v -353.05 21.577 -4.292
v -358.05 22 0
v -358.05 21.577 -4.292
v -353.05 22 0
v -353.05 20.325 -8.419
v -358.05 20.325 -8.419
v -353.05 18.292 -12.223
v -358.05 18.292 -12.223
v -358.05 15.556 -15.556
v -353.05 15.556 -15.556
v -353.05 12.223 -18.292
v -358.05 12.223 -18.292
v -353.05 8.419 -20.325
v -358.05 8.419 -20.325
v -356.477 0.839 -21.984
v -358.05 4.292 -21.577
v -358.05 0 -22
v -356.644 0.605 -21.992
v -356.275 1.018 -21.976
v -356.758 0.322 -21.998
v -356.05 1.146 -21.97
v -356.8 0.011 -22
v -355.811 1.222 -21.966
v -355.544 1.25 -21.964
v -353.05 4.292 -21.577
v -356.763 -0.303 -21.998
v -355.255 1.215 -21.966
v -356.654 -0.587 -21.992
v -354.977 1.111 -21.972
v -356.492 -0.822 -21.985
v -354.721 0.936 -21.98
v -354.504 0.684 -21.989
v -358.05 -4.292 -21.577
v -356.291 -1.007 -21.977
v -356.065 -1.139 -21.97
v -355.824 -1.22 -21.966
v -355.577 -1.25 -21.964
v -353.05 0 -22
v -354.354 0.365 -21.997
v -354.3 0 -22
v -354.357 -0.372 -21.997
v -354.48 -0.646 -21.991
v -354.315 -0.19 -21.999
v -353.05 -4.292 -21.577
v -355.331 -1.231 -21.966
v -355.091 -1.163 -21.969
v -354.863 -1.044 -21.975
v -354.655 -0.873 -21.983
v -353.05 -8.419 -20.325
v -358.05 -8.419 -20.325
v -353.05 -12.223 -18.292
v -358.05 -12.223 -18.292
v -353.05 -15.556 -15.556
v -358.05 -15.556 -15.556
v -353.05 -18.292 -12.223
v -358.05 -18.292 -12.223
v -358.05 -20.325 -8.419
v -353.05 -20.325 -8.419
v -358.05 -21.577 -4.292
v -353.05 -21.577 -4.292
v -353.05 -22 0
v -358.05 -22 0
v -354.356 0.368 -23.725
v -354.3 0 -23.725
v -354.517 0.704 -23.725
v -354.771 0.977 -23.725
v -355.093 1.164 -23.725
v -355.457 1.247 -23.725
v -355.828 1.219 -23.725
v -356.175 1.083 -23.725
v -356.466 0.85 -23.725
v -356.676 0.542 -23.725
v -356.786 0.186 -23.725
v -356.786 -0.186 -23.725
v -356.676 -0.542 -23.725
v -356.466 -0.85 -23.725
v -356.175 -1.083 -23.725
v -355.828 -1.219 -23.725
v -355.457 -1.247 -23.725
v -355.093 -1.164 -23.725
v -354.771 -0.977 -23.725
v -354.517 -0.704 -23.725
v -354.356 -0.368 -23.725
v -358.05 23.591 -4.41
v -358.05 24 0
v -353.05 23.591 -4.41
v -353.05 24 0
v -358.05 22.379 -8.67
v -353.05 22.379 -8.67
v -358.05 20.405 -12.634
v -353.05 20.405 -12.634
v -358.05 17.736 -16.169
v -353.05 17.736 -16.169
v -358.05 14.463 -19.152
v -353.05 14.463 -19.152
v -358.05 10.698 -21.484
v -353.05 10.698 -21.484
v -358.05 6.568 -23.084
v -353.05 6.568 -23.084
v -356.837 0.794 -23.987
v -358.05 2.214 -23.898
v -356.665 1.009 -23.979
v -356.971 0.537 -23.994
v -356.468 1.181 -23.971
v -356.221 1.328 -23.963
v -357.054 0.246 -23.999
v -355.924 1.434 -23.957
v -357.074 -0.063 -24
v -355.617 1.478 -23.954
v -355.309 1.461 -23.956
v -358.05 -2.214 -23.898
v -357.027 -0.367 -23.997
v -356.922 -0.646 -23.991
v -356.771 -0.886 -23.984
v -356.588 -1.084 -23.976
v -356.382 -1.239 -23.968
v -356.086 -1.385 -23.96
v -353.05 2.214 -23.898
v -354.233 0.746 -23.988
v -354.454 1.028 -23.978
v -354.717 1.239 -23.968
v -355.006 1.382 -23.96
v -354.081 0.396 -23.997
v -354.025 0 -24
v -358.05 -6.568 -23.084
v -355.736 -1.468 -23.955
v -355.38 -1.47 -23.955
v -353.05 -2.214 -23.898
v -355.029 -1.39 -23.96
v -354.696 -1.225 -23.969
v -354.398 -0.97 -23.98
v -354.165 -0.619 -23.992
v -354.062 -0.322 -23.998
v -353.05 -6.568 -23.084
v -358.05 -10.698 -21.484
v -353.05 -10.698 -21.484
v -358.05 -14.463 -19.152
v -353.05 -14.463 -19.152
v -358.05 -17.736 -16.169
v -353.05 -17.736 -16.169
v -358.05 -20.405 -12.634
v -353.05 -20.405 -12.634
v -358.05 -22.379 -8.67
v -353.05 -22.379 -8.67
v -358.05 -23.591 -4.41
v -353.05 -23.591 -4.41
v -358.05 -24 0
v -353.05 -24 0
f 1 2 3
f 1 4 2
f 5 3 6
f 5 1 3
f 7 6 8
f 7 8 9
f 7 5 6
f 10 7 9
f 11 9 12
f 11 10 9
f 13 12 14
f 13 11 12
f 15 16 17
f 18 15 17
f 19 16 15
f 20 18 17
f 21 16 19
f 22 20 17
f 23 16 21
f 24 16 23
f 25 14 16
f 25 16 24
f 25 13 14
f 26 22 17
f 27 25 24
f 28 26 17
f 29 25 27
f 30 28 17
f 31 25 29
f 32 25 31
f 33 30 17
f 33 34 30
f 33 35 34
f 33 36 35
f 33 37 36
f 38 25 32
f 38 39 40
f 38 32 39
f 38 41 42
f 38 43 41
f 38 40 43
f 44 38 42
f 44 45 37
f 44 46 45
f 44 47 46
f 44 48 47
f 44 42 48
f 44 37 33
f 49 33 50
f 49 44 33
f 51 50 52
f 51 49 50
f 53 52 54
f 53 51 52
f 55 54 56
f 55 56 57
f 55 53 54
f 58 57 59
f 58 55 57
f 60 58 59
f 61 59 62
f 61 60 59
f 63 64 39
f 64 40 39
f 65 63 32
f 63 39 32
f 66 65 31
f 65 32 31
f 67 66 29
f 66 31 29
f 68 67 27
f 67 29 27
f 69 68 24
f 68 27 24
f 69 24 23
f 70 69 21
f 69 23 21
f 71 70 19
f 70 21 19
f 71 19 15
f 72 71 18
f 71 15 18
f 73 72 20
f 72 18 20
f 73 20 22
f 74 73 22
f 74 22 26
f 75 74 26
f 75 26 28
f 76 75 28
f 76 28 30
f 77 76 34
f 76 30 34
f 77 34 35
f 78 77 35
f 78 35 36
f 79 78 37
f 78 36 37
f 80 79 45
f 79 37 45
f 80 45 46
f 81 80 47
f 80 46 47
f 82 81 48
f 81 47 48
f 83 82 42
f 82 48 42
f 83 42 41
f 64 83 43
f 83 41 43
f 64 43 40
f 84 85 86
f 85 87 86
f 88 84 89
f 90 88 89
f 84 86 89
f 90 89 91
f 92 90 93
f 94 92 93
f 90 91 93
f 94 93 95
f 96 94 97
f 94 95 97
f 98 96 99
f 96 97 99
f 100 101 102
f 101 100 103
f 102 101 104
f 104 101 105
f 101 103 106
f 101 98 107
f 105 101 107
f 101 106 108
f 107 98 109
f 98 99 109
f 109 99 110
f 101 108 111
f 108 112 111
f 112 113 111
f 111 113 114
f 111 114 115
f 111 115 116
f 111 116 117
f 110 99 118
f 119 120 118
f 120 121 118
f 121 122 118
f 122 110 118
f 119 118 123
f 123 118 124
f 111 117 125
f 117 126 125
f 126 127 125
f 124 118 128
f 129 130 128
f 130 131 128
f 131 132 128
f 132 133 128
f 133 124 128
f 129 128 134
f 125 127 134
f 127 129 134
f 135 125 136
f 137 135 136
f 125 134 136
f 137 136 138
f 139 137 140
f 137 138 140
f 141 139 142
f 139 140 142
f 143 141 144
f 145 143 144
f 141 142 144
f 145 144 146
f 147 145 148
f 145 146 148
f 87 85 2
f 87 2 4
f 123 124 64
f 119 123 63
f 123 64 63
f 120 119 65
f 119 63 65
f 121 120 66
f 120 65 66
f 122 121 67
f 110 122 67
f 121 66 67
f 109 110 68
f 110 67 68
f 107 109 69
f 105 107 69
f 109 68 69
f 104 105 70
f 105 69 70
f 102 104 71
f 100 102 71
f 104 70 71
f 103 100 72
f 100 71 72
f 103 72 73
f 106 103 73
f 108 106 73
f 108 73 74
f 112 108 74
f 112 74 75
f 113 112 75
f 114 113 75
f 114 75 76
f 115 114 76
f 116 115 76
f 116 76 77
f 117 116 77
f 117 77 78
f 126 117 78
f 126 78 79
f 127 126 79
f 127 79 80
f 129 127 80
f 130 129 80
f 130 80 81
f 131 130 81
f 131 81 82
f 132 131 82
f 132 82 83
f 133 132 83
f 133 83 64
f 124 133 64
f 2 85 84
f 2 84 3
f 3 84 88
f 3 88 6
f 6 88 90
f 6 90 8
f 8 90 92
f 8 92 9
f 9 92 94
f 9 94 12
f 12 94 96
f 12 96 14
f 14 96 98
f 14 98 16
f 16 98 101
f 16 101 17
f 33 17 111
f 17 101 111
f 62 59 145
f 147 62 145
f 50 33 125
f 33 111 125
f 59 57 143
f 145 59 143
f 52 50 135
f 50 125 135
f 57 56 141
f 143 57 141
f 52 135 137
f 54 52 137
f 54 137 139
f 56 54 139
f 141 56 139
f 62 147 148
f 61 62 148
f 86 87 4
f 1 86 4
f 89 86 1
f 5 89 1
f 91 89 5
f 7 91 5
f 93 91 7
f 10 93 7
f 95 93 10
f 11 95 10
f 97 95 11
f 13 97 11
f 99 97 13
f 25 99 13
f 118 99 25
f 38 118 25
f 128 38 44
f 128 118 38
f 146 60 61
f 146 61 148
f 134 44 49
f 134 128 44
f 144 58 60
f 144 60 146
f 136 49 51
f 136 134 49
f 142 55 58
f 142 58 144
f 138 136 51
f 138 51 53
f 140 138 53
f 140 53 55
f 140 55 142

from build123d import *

# Parameters (mm, degrees)
SKICA1_W              = 5
SKICA1_H              = 2
ROTOVAT1_ANGLE        = 180
M3_Z_VIT1_D           = 2.5
M3_Z_VIT1_CSINK_D     = 3.05
M3_Z_VIT1_CSINK_ANGLE = 90


with BuildPart() as part:
    # Skica1 → Rotovat1 (revolve)
    with BuildSketch(Plane.XY):
        with Locations((-355.55, 23)):
            Rectangle(SKICA1_W, SKICA1_H)
    revolve(axis=Axis((-344.904513271, 0, 0), (-1, 0, 0)), revolution_arc=ROTOVAT1_ANGLE)

    # M3 závit1 (through all)
    with Locations(Plane(origin=(-355.55, 0, -24), x_dir=(-1, 0, 0), z_dir=(0, 0, -1))):
        with Locations((0, 0)):
            CounterSinkHole(M3_Z_VIT1_D / 2, M3_Z_VIT1_CSINK_D / 2, counter_sink_angle=M3_Z_VIT1_CSINK_ANGLE)


solid = part.part
